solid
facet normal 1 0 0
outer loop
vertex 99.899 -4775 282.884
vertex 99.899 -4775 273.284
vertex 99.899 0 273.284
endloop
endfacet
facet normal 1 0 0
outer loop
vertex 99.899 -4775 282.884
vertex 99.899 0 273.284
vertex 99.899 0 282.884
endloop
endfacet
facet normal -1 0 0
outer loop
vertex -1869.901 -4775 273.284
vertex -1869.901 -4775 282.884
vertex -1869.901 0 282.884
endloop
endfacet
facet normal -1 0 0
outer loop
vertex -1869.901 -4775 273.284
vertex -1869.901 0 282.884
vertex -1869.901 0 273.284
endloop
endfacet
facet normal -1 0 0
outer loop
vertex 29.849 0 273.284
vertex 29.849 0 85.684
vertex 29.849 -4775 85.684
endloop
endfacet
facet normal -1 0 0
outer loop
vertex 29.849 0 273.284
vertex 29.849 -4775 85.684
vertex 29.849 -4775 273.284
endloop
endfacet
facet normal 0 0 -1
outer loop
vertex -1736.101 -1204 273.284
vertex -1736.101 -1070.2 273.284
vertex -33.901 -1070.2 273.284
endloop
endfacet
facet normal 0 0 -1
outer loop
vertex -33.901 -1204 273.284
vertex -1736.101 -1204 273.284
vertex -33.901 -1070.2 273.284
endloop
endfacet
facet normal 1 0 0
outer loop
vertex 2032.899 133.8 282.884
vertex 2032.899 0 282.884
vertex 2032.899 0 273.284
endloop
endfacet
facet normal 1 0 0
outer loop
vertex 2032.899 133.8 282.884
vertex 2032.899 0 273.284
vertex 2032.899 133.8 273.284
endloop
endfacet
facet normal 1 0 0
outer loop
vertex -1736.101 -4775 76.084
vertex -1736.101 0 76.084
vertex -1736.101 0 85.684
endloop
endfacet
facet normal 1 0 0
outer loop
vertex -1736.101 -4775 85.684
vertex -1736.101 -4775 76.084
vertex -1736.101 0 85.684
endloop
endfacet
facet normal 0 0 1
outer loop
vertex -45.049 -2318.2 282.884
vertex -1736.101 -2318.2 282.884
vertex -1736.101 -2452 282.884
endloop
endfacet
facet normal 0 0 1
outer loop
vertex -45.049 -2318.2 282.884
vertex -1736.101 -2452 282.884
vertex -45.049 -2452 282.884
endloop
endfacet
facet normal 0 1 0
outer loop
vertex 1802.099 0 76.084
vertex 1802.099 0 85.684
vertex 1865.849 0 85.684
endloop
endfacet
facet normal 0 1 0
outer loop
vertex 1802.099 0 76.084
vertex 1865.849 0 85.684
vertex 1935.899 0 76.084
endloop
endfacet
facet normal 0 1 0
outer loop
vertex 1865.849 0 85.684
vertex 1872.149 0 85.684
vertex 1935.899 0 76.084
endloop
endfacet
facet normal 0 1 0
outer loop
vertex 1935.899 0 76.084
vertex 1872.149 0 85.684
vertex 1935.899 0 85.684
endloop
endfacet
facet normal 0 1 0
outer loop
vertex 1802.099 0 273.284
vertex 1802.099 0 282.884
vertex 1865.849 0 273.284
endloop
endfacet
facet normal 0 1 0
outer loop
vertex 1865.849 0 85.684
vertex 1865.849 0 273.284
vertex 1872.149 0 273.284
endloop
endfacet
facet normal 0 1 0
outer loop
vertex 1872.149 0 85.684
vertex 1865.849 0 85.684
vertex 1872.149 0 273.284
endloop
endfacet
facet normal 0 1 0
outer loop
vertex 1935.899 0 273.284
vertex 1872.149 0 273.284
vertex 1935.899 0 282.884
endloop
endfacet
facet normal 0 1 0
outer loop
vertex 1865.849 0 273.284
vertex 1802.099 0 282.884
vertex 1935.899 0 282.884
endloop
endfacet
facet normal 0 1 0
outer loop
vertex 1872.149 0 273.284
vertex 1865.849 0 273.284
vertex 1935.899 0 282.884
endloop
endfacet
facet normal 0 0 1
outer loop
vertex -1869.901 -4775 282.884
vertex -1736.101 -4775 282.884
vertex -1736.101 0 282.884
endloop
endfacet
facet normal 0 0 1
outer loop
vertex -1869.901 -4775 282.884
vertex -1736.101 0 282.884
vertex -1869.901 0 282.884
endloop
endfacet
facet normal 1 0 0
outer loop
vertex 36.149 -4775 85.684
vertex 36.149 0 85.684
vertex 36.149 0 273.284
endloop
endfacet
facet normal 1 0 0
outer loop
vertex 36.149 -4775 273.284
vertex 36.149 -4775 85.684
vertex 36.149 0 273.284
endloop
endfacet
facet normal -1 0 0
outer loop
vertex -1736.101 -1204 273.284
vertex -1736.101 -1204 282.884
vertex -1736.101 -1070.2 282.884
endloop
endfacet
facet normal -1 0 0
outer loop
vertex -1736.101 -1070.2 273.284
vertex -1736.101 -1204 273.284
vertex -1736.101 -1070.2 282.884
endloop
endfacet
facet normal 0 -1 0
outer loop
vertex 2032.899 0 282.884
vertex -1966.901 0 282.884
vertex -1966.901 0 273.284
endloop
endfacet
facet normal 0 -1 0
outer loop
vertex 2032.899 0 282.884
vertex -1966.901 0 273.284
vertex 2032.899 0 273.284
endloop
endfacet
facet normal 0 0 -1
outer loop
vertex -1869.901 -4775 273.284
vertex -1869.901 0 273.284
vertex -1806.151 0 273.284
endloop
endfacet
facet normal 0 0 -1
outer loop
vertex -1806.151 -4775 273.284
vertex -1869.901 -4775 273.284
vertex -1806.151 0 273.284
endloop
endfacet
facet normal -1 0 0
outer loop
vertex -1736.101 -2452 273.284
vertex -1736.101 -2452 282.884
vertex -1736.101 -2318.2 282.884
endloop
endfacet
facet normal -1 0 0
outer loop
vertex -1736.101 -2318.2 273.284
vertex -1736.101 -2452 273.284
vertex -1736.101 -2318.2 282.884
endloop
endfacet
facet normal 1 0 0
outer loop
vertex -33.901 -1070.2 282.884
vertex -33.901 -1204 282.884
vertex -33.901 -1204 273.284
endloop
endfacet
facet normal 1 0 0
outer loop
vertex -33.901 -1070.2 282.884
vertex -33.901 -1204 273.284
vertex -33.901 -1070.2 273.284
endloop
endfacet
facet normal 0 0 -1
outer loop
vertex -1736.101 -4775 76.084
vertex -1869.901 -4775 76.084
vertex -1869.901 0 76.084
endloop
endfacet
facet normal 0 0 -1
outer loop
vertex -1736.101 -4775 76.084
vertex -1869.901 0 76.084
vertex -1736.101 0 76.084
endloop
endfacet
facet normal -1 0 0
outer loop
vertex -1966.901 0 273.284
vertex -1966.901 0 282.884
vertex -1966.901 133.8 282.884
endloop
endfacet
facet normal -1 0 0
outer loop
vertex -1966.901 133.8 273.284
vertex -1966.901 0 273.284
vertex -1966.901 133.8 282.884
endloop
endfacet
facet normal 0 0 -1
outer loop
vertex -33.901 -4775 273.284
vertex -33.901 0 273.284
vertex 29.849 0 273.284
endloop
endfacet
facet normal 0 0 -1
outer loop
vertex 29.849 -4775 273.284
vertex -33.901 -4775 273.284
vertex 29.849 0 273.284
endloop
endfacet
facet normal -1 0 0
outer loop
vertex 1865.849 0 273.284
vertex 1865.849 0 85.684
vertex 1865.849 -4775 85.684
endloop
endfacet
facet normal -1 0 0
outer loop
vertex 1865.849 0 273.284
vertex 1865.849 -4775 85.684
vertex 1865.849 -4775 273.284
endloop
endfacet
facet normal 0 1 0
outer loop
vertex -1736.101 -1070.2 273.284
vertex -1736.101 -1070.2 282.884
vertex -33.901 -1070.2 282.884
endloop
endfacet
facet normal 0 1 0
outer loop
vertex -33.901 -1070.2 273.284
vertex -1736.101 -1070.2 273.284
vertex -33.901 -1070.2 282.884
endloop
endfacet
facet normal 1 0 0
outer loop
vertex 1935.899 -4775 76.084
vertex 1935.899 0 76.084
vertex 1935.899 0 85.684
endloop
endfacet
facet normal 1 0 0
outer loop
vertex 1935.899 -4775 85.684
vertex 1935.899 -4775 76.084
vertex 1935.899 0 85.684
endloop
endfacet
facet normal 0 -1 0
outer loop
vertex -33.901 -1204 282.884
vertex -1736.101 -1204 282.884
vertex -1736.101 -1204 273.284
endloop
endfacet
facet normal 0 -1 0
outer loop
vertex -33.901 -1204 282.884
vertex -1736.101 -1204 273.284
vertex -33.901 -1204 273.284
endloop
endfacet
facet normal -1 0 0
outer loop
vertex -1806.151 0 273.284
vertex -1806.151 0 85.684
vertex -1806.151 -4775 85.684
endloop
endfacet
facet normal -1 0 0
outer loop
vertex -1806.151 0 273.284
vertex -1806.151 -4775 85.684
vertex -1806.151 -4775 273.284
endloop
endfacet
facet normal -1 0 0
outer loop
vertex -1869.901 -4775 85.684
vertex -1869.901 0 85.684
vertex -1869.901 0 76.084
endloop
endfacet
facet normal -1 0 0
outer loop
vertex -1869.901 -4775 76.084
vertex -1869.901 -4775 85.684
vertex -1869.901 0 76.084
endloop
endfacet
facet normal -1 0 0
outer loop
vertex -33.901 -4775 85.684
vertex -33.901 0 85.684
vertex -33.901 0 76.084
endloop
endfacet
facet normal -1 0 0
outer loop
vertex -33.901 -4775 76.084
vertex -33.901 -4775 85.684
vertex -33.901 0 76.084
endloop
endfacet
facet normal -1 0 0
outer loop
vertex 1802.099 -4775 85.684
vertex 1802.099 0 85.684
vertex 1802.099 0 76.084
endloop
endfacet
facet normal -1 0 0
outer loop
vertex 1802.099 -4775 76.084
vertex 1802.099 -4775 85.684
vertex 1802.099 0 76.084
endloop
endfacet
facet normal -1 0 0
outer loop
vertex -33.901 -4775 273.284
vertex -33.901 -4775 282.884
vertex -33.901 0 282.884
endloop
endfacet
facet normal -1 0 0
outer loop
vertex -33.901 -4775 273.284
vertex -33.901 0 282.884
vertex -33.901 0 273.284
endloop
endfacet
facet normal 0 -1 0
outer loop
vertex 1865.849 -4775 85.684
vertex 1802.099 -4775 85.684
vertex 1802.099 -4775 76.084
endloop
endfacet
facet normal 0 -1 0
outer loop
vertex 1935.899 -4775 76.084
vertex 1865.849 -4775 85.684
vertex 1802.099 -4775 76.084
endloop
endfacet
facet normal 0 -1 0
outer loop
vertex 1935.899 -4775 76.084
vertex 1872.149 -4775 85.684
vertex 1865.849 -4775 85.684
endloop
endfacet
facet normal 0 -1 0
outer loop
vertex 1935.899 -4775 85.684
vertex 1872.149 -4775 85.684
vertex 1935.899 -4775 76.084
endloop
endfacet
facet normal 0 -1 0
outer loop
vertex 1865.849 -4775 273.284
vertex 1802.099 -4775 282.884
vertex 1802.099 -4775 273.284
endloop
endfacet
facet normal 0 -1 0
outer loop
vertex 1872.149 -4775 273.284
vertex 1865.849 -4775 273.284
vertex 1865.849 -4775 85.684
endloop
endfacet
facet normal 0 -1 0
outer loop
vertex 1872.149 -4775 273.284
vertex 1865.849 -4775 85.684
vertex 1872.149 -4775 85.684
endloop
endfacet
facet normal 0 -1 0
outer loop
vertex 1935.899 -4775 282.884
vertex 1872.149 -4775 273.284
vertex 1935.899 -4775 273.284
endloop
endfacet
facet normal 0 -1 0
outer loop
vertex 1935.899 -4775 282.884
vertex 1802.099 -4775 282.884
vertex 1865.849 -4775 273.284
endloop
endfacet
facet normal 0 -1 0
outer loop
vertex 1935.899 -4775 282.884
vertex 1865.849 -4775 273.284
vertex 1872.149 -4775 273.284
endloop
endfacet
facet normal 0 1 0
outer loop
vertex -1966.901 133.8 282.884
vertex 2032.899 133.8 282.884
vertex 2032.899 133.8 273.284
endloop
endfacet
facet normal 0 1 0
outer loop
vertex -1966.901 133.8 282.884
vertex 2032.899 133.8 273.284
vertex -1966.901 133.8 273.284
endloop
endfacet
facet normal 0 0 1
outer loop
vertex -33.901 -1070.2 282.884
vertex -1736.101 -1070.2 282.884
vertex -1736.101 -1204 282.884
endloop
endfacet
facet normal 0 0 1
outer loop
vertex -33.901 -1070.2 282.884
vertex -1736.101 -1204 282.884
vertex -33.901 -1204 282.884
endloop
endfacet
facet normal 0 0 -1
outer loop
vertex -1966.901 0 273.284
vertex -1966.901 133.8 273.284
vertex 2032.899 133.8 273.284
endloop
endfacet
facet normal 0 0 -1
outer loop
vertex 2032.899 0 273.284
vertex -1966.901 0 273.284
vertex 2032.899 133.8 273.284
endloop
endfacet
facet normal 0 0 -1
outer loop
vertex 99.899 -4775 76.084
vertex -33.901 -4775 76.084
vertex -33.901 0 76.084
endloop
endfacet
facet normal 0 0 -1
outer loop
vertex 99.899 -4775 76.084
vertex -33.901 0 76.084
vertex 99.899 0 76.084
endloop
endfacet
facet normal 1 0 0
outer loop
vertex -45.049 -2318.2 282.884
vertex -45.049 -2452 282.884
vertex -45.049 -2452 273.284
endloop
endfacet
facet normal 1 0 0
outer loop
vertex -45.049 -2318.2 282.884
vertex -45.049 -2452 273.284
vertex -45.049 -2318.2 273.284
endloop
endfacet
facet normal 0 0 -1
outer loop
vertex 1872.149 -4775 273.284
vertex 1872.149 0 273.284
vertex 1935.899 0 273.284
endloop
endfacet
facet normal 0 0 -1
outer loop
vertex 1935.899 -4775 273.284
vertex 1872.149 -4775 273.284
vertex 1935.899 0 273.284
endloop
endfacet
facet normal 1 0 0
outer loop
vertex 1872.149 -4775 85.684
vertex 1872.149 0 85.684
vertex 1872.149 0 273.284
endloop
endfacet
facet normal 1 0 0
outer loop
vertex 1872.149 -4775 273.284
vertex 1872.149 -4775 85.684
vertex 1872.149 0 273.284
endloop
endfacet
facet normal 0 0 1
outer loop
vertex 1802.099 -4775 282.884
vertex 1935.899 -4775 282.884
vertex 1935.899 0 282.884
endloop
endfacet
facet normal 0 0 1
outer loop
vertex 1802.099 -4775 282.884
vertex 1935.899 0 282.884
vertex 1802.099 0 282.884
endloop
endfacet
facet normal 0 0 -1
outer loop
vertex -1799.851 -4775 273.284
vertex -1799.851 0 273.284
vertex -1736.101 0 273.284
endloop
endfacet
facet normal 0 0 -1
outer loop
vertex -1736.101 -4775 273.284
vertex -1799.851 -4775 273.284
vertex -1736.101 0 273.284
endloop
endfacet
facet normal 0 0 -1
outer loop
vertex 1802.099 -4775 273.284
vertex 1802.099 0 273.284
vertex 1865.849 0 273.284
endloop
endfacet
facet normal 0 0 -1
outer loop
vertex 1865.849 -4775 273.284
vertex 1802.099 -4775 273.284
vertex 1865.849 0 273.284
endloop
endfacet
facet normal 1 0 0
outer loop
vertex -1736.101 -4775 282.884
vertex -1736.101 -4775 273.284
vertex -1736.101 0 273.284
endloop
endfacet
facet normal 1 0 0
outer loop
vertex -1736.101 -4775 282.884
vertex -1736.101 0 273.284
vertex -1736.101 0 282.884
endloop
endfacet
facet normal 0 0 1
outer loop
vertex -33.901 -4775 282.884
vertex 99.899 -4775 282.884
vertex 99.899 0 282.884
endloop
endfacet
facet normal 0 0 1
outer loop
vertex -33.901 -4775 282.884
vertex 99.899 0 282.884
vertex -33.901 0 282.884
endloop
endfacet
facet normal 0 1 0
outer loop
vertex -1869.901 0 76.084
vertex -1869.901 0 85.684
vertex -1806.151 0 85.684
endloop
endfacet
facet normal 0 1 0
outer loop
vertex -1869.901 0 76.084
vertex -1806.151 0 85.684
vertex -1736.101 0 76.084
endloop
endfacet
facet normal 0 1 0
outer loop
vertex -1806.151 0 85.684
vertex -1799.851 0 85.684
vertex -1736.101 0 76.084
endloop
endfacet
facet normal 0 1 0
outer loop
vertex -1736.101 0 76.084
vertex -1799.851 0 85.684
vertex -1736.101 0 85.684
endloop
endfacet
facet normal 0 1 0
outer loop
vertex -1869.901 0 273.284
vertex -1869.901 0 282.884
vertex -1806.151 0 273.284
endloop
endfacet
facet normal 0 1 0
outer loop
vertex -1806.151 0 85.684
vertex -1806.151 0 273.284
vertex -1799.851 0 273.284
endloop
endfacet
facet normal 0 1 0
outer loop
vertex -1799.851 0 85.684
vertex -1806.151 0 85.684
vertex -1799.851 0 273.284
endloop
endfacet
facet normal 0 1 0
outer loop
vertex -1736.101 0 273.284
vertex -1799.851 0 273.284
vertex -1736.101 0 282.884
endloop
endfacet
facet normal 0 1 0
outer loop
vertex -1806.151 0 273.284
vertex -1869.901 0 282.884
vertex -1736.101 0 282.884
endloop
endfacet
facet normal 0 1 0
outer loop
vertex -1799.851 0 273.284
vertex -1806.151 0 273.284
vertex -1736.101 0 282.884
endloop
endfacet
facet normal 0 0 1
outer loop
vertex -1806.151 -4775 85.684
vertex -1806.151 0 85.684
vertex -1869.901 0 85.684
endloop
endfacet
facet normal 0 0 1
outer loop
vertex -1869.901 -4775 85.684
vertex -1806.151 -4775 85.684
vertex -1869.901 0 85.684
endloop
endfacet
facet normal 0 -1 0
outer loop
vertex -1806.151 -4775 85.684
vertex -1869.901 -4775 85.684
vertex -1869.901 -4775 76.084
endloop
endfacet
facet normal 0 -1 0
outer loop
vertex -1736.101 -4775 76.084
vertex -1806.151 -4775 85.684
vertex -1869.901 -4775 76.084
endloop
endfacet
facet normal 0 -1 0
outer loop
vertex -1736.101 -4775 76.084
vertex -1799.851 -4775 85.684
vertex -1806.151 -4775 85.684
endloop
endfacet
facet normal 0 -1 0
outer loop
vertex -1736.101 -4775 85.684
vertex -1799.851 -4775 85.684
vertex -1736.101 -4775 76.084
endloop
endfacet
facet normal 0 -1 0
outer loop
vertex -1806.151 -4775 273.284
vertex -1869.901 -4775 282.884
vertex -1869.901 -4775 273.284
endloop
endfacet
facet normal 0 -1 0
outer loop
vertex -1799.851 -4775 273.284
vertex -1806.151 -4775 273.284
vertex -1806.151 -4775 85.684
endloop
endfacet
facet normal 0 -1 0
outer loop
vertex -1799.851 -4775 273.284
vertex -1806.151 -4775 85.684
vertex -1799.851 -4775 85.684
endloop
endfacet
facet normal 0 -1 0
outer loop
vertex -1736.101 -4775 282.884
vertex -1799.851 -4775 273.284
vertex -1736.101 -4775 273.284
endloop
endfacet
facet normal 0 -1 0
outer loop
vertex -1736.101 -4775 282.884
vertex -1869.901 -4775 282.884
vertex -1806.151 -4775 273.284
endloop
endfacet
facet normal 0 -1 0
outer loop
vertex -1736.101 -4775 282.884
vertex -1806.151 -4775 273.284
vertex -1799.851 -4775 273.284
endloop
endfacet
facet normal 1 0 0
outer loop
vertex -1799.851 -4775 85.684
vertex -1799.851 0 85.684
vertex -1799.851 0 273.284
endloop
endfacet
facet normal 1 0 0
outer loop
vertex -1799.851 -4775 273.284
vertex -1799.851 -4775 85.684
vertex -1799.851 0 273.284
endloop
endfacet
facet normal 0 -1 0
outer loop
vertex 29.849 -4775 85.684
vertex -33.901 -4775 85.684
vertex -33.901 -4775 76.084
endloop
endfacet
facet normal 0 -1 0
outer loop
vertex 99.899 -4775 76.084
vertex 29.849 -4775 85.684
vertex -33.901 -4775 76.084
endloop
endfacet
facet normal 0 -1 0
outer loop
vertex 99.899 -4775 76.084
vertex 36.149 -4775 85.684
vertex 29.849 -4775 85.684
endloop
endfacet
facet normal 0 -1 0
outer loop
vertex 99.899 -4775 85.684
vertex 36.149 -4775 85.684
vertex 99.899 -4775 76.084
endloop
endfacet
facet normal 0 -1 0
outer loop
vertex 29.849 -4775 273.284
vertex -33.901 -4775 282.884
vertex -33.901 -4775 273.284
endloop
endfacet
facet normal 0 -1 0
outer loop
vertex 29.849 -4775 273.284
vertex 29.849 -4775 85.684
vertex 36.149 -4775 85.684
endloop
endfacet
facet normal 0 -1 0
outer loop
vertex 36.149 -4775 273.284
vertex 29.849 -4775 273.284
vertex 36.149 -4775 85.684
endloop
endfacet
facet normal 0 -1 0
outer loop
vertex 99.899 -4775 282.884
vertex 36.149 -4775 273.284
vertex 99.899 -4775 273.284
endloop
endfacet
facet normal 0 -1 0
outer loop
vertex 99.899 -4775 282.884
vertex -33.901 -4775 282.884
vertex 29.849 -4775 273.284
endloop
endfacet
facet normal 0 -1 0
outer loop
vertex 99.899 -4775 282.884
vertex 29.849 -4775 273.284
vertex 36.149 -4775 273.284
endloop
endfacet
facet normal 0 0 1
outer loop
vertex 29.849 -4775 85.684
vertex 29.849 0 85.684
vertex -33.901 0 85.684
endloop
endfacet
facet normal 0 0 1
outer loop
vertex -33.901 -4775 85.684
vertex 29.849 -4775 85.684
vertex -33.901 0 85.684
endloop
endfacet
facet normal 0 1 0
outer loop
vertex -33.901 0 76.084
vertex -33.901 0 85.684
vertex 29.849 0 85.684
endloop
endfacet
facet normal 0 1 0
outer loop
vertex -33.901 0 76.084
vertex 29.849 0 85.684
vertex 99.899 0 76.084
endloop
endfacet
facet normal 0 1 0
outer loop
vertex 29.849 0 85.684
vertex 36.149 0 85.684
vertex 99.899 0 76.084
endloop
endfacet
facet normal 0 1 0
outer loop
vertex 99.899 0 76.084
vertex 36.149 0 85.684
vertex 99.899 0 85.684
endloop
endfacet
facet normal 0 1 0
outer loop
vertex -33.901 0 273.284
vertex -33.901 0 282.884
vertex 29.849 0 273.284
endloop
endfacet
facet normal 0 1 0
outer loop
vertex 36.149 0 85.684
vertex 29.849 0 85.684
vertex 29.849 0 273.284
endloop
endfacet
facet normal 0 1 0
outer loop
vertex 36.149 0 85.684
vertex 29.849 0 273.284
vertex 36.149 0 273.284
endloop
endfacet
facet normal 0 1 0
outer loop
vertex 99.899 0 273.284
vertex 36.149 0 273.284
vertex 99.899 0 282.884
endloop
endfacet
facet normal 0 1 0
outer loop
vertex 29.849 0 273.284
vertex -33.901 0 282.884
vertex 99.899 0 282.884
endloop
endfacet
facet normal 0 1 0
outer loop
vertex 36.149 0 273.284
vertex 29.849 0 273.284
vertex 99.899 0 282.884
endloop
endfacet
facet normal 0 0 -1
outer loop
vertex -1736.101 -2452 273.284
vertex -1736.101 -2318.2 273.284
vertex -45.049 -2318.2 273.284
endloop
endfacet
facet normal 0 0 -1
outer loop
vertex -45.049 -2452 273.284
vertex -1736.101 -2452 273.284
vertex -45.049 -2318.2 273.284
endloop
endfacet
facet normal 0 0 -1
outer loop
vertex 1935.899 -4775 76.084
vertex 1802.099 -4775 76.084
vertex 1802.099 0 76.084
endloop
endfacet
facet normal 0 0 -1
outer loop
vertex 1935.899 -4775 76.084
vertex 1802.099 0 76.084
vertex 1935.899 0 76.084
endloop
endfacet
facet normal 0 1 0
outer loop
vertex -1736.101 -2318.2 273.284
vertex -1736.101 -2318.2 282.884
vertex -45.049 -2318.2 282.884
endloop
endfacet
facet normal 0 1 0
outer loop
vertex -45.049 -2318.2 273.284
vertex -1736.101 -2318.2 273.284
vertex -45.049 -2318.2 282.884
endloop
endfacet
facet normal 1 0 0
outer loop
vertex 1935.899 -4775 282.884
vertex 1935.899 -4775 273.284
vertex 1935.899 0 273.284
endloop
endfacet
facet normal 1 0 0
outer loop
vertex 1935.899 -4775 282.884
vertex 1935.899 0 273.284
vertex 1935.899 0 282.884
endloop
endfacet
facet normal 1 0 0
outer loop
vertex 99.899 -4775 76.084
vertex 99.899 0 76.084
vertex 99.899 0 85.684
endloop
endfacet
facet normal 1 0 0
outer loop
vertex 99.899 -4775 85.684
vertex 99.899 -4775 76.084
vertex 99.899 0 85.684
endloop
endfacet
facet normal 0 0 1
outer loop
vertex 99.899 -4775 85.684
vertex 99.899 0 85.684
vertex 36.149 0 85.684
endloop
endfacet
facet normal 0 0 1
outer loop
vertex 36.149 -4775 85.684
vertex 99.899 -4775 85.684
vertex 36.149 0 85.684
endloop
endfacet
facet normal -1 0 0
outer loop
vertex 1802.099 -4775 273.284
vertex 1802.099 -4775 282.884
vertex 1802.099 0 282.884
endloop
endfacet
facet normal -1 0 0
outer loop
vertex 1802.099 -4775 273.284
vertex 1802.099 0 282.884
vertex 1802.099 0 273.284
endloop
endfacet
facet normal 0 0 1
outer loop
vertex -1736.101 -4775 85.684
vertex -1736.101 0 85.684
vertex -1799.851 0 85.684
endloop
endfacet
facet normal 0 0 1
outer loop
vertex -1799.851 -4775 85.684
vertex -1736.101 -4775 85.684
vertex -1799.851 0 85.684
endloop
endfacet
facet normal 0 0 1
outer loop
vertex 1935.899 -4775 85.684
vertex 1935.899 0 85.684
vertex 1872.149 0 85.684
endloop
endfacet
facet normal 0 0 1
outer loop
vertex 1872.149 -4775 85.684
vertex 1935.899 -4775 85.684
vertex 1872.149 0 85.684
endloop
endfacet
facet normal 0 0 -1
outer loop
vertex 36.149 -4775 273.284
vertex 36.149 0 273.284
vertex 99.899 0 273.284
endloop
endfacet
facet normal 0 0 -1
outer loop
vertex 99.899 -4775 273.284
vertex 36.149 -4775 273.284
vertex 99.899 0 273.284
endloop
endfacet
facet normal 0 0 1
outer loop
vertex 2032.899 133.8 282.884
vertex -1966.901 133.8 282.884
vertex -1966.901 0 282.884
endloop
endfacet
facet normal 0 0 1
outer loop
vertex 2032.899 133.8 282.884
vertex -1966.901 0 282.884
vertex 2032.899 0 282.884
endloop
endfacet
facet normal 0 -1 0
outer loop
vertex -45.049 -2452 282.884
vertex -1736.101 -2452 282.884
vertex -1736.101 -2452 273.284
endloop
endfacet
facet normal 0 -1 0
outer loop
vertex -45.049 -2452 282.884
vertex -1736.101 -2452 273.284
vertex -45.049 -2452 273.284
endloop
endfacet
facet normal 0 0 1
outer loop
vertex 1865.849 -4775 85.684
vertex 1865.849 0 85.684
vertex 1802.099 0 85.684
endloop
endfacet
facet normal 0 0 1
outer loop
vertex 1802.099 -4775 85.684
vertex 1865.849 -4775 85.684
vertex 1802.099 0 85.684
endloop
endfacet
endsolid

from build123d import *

# Parameters (mm, degrees)
F0_W     = 6.3
F0_H     = 187.6
F1_DEPTH = 4775
F2_W     = 97
F2_H     = 133.8
F2_W_2   = 1702.2
F2_W_3   = 1691.052348
F3_DEPTH = 9.6


with BuildPart() as f1:
    # F0 (on Front) → F1 (new body)
    with BuildSketch(Plane.XZ):
        Polygon((-1736.101326, 282.884297), (-1869.901326, 282.884297), (-1869.901326, 273.284297), (-1806.151326, 273.284297), (-1799.851326, 273.284297), (-1736.101326, 273.284297), align=None)
        with Locations((-1803.001326, 179.484297)):
            Rectangle(F0_W, F0_H)
        Polygon((-1799.851326, 85.684297), (-1806.151326, 85.684297), (-1869.901326, 85.684297), (-1869.901326, 76.084297), (-1736.101326, 76.084297), (-1736.101326, 85.684297), align=None)
        with Locations((32.998674, 179.484297)):
            Rectangle(F0_W, F0_H)
        Polygon((-33.901326, 76.084297), (99.898674, 76.084297), (99.898674, 85.684297), (36.148674, 85.684297), (29.848674, 85.684297), (-33.901326, 85.684297), align=None)
        Polygon((29.848674, 273.284297), (36.148674, 273.284297), (99.898674, 273.284297), (99.898674, 282.884297), (-33.901326, 282.884297), (-33.901326, 273.284297), align=None)
        Polygon((1935.898674, 282.884297), (1802.098674, 282.884297), (1802.098674, 273.284297), (1865.848674, 273.284297), (1872.148674, 273.284297), (1935.898674, 273.284297), align=None)
        with Locations((1868.998674, 179.484297)):
            Rectangle(F0_W, F0_H)
        Polygon((1872.148674, 85.684297), (1865.848674, 85.684297), (1802.098674, 85.684297), (1802.098674, 76.084297), (1935.898674, 76.084297), (1935.898674, 85.684297), align=None)
    extrude(amount=F1_DEPTH)


with BuildPart() as f3:
    # F2 (on face) → F3 (new body)
    with BuildSketch(Plane.XY.offset(282.884297)):
        Polygon((-1869.901326, 133.8), (-1869.901326, 0), (-1736.101326, 0), (1935.898674, 0), (1935.898674, 133.8), align=None)
        with Locations((-1918.401326, 66.9)):
            Rectangle(F2_W, F2_H)
        with Locations((1984.398674, 66.9)):
            Rectangle(F2_W, F2_H)
        with Locations((-885.001326, -1137.1)):
            Rectangle(F2_W_2, F2_H)
        with Locations((-890.575152, -2385.1)):
            Rectangle(F2_W_3, F2_H)
    extrude(amount=-F3_DEPTH)


solid = Compound([f1.part, f3.part])
